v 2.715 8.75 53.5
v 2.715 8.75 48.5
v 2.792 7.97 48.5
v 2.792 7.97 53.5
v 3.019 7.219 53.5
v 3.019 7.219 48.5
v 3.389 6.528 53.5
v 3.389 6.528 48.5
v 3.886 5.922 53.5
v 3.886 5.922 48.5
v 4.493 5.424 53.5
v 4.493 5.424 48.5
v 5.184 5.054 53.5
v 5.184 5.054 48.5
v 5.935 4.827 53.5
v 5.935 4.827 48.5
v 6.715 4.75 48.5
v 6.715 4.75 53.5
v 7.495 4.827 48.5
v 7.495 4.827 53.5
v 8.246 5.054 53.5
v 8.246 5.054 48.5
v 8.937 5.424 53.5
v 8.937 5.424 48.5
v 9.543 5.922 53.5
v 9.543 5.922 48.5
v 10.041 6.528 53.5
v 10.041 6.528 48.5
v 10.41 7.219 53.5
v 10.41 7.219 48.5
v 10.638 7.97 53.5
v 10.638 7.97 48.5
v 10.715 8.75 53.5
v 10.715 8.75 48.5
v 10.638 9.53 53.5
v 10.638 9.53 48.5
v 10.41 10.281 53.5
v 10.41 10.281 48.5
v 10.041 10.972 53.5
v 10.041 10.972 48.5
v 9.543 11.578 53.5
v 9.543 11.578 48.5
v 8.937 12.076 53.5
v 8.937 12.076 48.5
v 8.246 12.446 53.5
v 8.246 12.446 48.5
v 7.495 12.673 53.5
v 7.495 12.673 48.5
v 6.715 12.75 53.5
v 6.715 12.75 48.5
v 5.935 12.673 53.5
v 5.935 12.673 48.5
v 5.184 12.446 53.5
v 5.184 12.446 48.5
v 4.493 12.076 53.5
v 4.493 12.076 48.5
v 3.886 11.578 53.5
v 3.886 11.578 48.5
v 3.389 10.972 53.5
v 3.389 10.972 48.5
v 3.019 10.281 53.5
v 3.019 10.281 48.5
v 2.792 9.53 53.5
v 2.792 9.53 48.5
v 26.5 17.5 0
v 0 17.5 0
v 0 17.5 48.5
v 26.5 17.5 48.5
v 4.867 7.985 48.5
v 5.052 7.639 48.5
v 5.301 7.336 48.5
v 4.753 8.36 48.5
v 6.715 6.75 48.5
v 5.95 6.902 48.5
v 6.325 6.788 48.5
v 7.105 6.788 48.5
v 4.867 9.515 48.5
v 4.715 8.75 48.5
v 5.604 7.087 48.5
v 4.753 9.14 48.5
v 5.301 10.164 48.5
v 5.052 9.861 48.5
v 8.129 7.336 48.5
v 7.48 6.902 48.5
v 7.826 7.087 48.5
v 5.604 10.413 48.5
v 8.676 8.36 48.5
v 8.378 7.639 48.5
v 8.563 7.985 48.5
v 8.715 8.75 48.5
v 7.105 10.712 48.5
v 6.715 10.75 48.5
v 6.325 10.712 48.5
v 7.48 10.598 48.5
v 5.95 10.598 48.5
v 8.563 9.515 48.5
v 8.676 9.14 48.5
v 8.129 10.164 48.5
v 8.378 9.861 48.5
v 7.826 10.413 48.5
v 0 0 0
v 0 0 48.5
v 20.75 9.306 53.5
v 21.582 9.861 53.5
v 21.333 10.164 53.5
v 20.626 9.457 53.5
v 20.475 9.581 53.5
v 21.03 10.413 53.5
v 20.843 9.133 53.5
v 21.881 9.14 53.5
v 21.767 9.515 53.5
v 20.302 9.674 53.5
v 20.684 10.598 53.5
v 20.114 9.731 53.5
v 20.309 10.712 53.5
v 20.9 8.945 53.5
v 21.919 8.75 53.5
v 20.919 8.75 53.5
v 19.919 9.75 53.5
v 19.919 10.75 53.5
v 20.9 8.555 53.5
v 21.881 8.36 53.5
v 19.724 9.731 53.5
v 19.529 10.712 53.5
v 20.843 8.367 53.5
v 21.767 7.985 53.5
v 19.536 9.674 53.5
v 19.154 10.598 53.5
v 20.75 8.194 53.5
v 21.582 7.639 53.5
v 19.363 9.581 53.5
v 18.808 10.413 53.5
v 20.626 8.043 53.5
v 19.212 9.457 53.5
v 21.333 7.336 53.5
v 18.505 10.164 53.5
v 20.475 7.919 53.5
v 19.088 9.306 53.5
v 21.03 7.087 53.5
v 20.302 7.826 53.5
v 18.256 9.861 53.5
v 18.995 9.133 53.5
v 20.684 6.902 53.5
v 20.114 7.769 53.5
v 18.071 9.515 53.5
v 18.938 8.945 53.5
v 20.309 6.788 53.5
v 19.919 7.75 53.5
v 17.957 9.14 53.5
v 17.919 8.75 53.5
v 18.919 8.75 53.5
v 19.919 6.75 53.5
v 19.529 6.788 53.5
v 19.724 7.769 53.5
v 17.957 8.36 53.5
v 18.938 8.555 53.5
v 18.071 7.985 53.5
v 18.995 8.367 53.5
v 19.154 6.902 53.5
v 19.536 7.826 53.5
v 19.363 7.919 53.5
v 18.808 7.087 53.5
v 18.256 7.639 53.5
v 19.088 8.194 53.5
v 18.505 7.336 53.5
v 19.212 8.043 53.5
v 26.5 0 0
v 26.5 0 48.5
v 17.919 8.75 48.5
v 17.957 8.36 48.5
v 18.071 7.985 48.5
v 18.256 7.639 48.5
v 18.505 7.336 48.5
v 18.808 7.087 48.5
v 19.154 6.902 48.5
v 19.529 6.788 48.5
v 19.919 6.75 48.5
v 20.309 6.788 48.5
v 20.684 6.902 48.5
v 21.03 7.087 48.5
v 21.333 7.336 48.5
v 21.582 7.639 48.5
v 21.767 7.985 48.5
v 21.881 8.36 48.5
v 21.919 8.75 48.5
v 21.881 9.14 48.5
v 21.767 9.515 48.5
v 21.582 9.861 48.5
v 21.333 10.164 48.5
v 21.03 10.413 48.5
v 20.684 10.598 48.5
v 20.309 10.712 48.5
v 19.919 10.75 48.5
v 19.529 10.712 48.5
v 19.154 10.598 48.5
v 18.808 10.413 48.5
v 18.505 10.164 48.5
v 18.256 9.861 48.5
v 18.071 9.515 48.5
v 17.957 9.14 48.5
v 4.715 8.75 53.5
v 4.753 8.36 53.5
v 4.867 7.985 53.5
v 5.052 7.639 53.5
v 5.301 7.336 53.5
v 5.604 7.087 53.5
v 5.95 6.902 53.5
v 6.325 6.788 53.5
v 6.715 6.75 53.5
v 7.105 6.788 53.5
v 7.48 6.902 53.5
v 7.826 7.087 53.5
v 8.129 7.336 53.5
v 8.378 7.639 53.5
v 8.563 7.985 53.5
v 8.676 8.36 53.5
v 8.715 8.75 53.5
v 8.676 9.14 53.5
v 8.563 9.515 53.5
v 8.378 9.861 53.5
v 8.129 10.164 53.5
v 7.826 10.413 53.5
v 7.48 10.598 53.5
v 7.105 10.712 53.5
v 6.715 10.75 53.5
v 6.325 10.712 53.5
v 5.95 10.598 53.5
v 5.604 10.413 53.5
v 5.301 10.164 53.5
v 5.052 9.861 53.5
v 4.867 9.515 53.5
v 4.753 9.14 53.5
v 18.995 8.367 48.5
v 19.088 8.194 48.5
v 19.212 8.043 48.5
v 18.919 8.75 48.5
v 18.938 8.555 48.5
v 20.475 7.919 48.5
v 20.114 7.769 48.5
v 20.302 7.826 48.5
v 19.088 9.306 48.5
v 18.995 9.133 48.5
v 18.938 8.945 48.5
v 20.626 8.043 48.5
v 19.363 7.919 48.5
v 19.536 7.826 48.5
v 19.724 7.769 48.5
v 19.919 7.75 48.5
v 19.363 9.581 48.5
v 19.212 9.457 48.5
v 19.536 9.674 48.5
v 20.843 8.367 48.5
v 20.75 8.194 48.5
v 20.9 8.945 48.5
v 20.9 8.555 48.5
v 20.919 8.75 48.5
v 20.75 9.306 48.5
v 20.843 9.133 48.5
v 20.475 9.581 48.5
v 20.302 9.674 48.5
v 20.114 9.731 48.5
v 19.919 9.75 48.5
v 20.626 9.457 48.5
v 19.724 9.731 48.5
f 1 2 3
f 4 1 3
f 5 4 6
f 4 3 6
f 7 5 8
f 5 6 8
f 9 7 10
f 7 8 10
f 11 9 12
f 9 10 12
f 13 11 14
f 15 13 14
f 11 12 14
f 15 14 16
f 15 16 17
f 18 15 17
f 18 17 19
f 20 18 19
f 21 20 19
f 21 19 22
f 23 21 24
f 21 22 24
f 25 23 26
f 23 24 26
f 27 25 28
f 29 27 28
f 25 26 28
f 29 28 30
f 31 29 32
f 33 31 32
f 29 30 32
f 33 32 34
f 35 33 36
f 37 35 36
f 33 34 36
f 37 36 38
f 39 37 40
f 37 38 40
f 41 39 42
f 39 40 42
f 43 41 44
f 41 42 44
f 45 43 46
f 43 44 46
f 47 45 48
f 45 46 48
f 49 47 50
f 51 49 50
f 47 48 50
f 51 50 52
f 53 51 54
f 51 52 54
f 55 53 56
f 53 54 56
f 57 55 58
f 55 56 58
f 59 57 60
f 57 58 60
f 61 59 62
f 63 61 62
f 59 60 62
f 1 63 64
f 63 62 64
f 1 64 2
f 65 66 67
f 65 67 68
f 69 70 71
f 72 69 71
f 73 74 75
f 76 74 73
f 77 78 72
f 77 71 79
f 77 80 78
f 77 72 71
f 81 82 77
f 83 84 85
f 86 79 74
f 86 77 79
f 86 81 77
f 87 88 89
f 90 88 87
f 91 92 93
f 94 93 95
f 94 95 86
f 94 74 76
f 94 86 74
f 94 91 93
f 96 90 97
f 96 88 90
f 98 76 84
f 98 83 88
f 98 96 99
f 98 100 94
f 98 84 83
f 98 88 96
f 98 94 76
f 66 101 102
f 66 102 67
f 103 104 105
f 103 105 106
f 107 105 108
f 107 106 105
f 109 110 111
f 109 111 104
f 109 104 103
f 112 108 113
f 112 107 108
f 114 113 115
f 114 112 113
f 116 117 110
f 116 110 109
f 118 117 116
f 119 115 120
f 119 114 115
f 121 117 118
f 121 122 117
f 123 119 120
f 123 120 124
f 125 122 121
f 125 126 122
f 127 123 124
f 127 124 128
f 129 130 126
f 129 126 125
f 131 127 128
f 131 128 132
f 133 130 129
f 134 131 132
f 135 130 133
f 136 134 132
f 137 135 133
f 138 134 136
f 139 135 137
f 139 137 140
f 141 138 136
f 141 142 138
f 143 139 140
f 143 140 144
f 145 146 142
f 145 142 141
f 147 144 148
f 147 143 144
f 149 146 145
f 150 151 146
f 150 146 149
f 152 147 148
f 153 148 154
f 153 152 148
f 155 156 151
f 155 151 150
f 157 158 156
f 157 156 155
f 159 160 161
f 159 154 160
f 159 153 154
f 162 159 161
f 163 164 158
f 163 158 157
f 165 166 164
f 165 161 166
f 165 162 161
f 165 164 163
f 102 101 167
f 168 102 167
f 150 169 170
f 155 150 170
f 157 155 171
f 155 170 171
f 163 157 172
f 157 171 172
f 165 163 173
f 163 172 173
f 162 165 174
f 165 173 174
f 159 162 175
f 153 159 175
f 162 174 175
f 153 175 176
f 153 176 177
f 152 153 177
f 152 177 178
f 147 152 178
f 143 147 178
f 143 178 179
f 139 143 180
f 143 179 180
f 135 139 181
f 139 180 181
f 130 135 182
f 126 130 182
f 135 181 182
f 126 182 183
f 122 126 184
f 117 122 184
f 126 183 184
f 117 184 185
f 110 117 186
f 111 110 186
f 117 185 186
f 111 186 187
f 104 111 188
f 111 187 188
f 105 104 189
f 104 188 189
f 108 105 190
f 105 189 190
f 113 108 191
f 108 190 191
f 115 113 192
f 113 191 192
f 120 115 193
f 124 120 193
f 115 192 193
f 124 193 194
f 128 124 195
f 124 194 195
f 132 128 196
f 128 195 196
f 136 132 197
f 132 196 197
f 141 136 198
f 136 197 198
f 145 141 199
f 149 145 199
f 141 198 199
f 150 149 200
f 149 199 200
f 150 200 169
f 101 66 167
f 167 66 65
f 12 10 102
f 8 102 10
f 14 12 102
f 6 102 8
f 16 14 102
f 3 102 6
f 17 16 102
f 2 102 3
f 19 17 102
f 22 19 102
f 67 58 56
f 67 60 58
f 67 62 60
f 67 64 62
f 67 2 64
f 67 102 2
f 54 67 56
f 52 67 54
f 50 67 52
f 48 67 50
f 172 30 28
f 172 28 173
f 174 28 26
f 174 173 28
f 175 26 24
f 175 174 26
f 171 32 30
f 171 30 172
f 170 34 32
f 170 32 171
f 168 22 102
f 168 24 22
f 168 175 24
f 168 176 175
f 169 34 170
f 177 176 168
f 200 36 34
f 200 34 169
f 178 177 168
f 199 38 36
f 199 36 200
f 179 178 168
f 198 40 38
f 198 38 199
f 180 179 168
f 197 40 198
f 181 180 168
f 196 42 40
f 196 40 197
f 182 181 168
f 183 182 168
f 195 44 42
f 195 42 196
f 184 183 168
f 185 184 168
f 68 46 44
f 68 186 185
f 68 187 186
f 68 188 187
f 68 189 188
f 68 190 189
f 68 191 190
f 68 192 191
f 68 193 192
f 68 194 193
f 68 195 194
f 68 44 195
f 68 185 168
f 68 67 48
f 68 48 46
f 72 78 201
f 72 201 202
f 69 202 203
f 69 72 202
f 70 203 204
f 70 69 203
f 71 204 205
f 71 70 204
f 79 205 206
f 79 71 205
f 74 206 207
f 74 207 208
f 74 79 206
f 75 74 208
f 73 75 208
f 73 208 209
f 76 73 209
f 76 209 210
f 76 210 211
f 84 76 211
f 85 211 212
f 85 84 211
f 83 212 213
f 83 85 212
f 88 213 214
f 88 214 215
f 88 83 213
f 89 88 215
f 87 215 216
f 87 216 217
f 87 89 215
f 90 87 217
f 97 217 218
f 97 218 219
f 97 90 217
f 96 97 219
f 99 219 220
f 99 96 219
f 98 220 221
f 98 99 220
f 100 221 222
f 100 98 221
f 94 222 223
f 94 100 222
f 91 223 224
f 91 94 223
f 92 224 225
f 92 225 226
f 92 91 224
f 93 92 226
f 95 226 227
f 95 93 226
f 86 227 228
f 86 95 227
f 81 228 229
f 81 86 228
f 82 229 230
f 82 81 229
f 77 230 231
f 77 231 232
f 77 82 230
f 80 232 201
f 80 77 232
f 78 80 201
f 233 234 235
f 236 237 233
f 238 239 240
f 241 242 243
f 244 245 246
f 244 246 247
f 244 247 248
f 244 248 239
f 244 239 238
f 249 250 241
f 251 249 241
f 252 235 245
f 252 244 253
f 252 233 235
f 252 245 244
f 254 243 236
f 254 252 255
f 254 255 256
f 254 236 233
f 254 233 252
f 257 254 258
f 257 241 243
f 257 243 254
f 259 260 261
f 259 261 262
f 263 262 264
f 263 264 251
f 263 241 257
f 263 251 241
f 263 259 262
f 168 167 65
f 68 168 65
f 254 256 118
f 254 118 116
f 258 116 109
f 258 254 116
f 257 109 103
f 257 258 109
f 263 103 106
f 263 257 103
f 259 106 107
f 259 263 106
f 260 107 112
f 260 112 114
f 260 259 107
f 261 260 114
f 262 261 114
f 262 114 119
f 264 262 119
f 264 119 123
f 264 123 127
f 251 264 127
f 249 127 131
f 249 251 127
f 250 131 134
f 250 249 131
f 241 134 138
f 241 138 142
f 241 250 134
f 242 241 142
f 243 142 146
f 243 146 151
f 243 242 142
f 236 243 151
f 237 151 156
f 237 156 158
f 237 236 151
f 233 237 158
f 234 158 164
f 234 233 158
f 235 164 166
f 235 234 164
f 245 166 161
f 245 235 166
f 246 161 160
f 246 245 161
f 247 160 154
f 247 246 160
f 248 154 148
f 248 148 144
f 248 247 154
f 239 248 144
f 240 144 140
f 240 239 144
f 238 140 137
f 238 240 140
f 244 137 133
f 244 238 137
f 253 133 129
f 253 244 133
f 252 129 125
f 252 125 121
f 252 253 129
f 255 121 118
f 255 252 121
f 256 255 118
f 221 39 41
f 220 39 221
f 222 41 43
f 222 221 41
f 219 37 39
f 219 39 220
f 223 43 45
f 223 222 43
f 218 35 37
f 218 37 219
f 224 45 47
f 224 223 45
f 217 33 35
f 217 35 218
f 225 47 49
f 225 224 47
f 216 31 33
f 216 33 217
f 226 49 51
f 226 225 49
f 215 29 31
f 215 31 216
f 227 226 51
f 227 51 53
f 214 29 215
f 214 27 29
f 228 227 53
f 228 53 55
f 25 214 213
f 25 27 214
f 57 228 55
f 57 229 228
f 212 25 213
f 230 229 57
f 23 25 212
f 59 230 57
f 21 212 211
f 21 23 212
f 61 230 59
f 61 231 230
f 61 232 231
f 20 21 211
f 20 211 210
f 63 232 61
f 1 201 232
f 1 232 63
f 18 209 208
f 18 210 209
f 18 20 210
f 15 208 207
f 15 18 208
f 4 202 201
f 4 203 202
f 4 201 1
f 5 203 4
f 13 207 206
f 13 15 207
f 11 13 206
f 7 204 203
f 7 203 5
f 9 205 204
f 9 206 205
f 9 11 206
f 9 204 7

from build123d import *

# Parameters (mm, degrees)
SKETCH1_W           = 26.5
SKETCH1_H           = 17.5
BOSS_EXTRUDE1_DEPTH = 48.5
SKETCH2_R           = 2
SKETCH2_R_2         = 1
SKETCH2_R_3         = 4
BOSS_EXTRUDE2_DEPTH = 5


with BuildPart() as part:
    # Sketch1 → Boss-Extrude1 (new body)
    with BuildSketch(Plane.XY):
        with Locations((13.25, 8.75)):
            Rectangle(SKETCH1_W, SKETCH1_H)
    extrude(amount=BOSS_EXTRUDE1_DEPTH)

    # Sketch2 → Boss-Extrude2 (add)
    # profile 1 of 2: a face of its own
    with BuildSketch(Plane.XY.offset(48.5)):
        with Locations(Location((19.919028118, 8.75, 0), (0, 0, 180))):
            Circle(SKETCH2_R)
        with Locations((19.919028118, 8.75)):
            Circle(SKETCH2_R_2, mode=Mode.SUBTRACT)
    # profile 2 of 2: a face of its own
    with BuildSketch(Plane.XY.offset(48.5)):
        with Locations(Location((6.714907482, 8.75, 0), (0, 0, 180))):
            Circle(SKETCH2_R_3)
        with Locations(Location((6.714907482, 8.75, 0), (0, 0, 180))):
            Circle(SKETCH2_R, mode=Mode.SUBTRACT)
    extrude(amount=BOSS_EXTRUDE2_DEPTH)


solid = part.part
